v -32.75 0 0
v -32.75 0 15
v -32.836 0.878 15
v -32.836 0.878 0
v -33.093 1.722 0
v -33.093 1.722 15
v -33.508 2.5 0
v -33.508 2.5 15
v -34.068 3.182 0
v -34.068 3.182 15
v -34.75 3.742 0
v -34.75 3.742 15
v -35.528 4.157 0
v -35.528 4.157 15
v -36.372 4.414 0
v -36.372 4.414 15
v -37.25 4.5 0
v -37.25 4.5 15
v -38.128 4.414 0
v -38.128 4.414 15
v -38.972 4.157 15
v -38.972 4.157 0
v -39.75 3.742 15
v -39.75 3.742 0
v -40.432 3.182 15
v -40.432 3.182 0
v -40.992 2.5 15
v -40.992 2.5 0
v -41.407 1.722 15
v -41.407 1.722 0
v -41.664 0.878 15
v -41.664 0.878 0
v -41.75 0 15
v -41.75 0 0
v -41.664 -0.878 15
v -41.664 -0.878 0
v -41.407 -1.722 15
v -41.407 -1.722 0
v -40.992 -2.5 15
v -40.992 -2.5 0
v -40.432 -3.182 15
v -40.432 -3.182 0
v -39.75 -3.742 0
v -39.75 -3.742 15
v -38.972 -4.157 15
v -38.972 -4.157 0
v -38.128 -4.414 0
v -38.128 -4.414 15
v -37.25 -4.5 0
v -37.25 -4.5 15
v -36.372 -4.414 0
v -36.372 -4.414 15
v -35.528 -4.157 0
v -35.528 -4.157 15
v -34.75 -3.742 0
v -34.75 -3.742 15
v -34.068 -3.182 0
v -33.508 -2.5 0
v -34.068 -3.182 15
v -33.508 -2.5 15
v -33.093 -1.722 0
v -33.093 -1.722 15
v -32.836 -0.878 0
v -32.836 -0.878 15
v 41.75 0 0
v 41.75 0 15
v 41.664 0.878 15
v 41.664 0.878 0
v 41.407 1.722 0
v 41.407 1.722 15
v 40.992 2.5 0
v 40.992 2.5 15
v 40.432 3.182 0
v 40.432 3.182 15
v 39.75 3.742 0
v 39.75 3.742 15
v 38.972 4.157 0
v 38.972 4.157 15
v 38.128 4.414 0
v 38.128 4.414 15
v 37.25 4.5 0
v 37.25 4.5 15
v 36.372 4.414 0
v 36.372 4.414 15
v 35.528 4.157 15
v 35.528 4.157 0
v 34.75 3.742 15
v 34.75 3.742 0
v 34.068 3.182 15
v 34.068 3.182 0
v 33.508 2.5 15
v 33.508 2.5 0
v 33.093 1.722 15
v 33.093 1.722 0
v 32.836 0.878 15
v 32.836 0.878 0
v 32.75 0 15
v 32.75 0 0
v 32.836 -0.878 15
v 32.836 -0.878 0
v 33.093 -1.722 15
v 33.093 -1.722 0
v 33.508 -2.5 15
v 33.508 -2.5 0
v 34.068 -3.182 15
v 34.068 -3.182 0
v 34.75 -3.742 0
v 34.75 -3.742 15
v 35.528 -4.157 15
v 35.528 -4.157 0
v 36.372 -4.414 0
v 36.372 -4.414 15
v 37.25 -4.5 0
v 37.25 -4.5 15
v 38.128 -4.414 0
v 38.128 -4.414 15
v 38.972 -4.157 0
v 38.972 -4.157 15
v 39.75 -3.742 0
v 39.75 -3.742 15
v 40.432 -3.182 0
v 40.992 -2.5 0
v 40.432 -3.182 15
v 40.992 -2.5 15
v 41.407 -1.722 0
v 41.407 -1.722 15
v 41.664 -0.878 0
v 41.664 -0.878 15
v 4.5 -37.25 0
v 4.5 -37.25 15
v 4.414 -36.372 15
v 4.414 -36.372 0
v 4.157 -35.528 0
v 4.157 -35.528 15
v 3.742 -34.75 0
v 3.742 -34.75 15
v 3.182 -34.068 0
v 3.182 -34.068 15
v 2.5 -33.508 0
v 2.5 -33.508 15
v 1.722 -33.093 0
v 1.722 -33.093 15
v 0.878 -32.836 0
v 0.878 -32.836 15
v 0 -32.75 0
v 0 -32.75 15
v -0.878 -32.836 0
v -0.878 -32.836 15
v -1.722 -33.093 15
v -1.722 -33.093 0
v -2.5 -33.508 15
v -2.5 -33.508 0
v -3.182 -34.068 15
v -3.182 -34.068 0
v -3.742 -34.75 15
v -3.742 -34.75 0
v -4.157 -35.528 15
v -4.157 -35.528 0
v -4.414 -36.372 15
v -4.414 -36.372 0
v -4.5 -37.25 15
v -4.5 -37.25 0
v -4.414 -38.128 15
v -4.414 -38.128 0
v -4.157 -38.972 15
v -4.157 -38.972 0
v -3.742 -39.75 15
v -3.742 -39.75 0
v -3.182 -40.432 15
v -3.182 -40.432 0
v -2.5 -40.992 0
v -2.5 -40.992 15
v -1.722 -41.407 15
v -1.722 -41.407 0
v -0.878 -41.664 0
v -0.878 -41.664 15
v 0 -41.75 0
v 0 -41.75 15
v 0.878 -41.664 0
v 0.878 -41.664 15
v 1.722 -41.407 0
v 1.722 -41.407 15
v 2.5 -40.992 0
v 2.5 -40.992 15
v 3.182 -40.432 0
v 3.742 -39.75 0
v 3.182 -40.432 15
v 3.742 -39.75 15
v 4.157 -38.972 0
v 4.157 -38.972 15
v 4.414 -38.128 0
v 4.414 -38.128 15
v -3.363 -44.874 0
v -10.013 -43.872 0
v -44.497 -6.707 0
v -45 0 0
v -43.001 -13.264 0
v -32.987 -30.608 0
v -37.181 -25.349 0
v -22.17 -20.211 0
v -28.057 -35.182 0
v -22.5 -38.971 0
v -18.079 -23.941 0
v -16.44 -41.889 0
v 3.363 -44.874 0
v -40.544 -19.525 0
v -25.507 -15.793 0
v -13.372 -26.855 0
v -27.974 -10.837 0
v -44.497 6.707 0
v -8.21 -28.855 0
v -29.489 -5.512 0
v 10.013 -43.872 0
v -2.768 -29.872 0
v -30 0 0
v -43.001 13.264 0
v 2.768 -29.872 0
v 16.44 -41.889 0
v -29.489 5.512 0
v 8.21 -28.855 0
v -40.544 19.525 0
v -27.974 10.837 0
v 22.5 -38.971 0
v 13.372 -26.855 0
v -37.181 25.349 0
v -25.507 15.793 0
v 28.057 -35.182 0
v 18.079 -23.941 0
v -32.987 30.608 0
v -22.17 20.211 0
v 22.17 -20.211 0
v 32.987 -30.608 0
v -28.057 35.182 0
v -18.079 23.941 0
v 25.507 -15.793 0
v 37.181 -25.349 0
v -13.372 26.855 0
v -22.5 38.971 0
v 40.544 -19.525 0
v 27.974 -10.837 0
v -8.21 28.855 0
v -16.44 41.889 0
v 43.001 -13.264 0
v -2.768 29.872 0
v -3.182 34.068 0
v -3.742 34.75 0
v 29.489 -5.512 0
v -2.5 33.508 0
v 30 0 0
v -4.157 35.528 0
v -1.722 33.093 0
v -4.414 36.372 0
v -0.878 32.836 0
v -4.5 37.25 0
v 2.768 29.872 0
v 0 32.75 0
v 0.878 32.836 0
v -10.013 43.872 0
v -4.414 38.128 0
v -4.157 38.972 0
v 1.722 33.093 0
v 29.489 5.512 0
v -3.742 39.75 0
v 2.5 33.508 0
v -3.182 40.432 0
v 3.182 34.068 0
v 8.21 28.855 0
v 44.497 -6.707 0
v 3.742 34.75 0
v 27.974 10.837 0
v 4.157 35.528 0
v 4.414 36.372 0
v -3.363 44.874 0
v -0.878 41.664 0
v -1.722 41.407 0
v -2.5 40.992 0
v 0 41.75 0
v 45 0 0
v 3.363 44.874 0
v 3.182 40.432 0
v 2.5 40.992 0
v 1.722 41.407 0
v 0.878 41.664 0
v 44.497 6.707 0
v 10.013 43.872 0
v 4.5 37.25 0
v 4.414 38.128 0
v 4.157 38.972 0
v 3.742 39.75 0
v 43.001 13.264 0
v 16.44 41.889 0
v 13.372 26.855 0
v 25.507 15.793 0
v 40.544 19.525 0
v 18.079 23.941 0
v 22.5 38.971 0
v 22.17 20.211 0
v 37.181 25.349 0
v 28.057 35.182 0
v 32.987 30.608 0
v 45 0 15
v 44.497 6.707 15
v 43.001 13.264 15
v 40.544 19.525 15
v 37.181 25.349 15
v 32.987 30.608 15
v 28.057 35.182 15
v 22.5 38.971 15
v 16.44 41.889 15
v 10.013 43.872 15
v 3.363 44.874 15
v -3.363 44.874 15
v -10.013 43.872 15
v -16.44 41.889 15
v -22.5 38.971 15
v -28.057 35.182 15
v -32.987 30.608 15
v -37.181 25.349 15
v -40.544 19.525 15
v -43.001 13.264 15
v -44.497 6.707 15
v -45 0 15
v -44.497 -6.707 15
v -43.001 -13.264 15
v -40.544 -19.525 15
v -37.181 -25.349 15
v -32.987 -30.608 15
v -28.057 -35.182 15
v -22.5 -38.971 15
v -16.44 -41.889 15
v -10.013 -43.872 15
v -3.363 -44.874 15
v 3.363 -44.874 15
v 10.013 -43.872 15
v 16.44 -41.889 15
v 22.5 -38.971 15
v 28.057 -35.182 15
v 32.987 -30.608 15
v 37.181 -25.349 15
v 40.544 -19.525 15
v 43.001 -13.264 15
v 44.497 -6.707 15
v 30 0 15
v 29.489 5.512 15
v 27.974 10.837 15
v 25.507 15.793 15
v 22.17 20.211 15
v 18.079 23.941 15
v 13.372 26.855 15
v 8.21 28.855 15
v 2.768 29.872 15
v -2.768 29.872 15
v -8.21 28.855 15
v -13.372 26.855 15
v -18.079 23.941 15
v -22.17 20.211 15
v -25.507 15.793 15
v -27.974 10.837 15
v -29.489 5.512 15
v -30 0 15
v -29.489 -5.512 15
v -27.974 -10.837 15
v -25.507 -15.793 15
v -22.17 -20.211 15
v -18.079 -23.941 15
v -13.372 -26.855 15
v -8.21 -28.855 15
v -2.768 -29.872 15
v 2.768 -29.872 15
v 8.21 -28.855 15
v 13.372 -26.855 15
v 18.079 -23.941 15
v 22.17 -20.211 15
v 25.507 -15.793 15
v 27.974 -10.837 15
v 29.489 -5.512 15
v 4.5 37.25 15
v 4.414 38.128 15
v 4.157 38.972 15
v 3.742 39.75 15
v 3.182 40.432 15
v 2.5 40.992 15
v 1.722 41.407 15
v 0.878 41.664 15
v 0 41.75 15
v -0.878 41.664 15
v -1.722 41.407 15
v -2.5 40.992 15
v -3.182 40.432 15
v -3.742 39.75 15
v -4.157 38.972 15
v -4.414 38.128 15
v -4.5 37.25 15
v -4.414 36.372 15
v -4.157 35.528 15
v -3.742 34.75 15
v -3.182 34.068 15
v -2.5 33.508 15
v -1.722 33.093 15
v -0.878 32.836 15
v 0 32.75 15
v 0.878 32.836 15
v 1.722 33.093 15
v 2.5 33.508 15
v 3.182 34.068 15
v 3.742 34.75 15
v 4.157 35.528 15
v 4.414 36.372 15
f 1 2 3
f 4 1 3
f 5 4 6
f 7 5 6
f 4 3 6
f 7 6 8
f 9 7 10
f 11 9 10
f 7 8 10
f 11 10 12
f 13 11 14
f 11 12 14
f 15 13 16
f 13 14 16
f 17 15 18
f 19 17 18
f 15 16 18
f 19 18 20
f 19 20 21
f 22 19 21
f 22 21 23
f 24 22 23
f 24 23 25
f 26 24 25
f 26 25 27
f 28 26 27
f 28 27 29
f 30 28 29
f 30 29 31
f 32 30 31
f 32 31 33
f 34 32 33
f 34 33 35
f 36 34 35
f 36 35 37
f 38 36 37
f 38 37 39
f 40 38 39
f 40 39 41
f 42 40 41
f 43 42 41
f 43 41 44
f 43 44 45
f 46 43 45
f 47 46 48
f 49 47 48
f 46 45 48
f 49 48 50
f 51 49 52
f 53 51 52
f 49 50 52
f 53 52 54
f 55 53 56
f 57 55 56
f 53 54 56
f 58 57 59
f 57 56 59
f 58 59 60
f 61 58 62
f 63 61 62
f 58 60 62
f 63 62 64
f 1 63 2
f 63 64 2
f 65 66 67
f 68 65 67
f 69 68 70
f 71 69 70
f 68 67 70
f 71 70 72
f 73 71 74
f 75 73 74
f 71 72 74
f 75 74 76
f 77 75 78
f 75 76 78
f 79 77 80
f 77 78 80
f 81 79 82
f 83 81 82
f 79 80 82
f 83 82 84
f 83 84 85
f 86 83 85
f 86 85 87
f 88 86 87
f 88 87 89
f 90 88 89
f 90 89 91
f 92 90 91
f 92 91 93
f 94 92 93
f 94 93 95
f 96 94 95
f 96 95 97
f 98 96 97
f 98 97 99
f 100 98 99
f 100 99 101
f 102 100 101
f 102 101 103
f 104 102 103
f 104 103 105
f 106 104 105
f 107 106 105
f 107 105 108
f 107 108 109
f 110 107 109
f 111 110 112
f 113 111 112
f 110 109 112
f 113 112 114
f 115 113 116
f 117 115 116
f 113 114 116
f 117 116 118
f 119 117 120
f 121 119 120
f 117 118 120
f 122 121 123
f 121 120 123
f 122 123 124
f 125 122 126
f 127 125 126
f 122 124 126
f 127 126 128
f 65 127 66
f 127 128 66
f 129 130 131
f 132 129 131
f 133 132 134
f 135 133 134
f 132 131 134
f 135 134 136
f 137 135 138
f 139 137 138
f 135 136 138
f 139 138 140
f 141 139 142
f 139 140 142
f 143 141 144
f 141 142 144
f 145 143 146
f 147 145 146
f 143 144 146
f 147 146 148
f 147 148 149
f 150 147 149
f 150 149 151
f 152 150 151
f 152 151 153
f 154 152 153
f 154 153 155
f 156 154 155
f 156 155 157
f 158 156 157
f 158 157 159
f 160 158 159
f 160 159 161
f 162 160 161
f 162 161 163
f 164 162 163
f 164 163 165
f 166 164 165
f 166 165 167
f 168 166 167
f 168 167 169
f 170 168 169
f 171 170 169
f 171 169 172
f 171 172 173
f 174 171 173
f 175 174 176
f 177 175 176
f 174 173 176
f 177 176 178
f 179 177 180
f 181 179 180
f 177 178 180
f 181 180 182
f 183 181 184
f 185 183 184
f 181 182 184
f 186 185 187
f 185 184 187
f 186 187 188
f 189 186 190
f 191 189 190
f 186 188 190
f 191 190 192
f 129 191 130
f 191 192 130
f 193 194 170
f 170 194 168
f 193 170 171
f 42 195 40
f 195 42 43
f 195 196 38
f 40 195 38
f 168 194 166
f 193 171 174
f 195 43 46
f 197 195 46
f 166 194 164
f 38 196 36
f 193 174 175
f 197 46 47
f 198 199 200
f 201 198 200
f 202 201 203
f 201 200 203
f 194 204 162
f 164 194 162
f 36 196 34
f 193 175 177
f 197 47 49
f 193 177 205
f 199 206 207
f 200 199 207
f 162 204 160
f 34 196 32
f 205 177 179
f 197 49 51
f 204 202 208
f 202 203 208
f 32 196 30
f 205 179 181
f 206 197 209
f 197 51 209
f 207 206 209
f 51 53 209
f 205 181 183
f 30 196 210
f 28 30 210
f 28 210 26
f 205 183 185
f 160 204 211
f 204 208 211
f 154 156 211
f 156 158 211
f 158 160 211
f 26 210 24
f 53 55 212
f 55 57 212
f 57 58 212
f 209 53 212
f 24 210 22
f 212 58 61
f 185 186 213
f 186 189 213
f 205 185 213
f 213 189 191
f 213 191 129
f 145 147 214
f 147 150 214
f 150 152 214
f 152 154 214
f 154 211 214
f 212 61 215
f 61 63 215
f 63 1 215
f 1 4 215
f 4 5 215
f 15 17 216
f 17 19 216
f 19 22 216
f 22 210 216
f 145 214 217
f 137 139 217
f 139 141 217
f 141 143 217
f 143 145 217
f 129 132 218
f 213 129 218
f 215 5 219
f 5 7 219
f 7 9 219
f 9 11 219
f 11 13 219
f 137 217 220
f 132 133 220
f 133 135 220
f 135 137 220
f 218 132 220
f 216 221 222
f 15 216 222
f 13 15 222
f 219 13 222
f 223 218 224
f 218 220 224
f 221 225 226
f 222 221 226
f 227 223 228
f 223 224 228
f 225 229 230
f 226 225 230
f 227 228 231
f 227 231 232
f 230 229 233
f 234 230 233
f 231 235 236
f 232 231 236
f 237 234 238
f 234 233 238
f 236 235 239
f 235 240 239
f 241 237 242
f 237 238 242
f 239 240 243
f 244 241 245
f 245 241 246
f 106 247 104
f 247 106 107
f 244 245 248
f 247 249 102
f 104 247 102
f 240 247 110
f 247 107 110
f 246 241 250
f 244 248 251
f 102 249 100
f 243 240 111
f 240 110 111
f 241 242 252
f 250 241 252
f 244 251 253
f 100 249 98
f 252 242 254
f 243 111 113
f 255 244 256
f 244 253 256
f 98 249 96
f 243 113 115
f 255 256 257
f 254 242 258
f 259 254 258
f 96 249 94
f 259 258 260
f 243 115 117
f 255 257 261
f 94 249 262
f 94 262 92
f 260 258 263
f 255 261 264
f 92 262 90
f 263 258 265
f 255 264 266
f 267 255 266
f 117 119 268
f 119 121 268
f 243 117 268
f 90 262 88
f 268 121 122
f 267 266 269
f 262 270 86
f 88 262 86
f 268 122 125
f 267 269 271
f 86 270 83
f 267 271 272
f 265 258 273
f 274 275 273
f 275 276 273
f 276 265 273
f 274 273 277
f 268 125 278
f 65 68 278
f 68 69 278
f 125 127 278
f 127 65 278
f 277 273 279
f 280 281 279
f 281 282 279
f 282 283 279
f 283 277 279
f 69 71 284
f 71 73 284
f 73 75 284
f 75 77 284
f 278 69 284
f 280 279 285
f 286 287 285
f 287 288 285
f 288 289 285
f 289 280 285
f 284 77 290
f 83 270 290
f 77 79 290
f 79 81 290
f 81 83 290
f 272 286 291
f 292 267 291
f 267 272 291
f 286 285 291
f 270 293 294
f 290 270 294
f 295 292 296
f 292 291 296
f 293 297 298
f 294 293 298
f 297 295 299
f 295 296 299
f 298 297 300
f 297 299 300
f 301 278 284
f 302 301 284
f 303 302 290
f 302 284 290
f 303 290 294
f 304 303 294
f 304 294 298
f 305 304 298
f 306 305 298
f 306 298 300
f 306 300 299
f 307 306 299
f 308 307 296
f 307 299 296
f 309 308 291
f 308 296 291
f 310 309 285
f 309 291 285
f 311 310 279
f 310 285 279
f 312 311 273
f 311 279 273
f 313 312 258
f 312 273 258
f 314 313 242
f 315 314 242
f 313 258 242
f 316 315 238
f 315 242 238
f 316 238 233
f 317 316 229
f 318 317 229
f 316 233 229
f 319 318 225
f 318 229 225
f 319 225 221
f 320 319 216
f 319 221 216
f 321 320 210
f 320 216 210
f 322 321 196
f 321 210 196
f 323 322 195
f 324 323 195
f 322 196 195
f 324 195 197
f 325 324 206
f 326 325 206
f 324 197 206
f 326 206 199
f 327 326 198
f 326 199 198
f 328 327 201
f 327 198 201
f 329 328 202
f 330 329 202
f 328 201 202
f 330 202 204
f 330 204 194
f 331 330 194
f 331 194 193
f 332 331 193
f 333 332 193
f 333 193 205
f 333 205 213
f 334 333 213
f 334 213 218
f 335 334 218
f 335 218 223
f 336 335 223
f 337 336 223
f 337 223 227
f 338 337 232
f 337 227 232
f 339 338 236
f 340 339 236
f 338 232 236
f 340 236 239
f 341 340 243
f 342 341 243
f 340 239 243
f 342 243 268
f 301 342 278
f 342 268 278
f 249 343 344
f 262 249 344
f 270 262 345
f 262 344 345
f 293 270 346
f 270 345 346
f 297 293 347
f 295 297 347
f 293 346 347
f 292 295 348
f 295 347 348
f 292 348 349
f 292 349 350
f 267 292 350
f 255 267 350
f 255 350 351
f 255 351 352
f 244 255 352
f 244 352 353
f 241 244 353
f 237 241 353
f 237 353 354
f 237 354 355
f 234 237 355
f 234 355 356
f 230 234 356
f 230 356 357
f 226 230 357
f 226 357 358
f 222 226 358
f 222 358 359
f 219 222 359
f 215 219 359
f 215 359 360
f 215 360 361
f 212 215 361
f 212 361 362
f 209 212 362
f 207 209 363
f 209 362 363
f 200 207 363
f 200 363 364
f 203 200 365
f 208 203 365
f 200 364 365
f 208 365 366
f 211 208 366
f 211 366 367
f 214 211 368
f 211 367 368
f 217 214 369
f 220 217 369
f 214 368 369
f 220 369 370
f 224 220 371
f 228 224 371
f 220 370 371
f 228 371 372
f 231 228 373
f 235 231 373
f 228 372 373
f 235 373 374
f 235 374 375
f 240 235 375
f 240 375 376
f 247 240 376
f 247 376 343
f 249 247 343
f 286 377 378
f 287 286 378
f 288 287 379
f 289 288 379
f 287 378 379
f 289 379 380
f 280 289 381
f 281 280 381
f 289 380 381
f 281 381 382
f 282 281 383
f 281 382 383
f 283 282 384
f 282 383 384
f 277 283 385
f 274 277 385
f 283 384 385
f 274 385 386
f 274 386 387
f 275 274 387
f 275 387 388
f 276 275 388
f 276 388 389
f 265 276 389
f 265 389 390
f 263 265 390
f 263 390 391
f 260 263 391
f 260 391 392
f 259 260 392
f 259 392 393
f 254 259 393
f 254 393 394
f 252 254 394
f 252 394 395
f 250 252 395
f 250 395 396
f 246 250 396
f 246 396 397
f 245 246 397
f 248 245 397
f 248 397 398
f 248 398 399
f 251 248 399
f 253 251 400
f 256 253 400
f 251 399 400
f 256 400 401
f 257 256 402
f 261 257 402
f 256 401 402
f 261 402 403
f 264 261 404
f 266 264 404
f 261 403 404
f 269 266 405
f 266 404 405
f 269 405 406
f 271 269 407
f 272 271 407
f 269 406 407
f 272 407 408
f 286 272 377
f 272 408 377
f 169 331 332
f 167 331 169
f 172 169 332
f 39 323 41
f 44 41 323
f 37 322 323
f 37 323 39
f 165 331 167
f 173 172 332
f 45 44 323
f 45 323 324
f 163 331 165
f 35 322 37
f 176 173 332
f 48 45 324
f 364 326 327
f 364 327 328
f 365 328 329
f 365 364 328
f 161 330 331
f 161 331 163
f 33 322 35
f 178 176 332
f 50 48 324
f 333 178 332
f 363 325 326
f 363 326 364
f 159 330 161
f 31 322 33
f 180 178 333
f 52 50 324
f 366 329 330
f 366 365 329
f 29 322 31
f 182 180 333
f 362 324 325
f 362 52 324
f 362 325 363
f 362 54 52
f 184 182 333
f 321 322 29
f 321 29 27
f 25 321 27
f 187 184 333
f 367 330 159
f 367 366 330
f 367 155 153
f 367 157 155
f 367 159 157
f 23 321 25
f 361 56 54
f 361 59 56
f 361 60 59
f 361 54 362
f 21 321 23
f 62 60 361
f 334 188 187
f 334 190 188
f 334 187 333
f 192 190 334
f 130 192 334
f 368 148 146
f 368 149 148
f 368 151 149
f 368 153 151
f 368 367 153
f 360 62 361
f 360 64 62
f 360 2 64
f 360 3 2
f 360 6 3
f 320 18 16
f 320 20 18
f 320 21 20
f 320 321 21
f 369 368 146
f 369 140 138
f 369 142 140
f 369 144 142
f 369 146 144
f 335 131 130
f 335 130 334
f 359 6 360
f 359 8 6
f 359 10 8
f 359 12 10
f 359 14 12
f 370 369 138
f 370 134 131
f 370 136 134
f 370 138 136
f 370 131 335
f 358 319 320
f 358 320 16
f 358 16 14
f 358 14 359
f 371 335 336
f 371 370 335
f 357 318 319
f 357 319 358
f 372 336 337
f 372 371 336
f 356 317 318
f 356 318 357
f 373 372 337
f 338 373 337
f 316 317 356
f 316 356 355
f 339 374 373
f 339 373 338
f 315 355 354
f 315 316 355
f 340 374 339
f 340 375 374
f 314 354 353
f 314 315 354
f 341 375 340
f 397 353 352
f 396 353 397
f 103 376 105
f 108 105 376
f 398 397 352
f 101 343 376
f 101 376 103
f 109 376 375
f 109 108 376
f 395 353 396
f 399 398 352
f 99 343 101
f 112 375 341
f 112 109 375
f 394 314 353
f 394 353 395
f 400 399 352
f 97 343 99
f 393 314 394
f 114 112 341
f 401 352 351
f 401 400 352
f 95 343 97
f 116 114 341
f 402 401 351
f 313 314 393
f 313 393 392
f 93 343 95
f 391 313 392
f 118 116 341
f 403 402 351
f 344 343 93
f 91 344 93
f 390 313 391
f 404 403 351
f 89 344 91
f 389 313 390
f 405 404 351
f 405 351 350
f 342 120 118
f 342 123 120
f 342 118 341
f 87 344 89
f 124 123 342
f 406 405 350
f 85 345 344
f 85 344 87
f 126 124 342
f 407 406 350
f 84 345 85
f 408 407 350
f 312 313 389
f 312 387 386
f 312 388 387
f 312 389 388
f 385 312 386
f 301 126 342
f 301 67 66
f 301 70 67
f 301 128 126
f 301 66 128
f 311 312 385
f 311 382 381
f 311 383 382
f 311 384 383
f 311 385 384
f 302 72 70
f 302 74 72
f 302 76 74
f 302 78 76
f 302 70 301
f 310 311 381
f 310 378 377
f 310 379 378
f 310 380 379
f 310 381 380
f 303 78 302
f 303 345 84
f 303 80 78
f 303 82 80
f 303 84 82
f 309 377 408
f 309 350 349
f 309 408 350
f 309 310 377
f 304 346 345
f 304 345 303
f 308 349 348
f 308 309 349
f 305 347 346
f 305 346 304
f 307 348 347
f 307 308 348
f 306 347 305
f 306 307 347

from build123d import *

# Parameters (mm, degrees)
F0_R     = 45
F1_DEPTH = 15
F2_R     = 30
F3_DEPTH = 15.001
F4_R     = 4.5
F5_DEPTH = 15.001


with BuildPart() as f1:
    # F0 (on Top) → F1 (new body)
    with BuildSketch(Plane.XY):
        Circle(F0_R)
    extrude(amount=F1_DEPTH)

    # F2 (on face) → F3 (cut, through all)
    with BuildSketch(Plane.XY.offset(15)):
        Circle(F2_R)
    extrude(amount=-F3_DEPTH, mode=Mode.SUBTRACT)

    # F4 (on face) → F5 (cut, through all)
    with BuildSketch(Plane.XY.offset(15)):
        with Locations((0, 37.25)):
            Circle(F4_R)
        with Locations((-37.25, 0)):
            Circle(F4_R)
        with Locations((37.25, 0)):
            Circle(F4_R)
        with Locations((0, -37.25)):
            Circle(F4_R)
    extrude(amount=-F5_DEPTH, mode=Mode.SUBTRACT)


solid = f1.part
